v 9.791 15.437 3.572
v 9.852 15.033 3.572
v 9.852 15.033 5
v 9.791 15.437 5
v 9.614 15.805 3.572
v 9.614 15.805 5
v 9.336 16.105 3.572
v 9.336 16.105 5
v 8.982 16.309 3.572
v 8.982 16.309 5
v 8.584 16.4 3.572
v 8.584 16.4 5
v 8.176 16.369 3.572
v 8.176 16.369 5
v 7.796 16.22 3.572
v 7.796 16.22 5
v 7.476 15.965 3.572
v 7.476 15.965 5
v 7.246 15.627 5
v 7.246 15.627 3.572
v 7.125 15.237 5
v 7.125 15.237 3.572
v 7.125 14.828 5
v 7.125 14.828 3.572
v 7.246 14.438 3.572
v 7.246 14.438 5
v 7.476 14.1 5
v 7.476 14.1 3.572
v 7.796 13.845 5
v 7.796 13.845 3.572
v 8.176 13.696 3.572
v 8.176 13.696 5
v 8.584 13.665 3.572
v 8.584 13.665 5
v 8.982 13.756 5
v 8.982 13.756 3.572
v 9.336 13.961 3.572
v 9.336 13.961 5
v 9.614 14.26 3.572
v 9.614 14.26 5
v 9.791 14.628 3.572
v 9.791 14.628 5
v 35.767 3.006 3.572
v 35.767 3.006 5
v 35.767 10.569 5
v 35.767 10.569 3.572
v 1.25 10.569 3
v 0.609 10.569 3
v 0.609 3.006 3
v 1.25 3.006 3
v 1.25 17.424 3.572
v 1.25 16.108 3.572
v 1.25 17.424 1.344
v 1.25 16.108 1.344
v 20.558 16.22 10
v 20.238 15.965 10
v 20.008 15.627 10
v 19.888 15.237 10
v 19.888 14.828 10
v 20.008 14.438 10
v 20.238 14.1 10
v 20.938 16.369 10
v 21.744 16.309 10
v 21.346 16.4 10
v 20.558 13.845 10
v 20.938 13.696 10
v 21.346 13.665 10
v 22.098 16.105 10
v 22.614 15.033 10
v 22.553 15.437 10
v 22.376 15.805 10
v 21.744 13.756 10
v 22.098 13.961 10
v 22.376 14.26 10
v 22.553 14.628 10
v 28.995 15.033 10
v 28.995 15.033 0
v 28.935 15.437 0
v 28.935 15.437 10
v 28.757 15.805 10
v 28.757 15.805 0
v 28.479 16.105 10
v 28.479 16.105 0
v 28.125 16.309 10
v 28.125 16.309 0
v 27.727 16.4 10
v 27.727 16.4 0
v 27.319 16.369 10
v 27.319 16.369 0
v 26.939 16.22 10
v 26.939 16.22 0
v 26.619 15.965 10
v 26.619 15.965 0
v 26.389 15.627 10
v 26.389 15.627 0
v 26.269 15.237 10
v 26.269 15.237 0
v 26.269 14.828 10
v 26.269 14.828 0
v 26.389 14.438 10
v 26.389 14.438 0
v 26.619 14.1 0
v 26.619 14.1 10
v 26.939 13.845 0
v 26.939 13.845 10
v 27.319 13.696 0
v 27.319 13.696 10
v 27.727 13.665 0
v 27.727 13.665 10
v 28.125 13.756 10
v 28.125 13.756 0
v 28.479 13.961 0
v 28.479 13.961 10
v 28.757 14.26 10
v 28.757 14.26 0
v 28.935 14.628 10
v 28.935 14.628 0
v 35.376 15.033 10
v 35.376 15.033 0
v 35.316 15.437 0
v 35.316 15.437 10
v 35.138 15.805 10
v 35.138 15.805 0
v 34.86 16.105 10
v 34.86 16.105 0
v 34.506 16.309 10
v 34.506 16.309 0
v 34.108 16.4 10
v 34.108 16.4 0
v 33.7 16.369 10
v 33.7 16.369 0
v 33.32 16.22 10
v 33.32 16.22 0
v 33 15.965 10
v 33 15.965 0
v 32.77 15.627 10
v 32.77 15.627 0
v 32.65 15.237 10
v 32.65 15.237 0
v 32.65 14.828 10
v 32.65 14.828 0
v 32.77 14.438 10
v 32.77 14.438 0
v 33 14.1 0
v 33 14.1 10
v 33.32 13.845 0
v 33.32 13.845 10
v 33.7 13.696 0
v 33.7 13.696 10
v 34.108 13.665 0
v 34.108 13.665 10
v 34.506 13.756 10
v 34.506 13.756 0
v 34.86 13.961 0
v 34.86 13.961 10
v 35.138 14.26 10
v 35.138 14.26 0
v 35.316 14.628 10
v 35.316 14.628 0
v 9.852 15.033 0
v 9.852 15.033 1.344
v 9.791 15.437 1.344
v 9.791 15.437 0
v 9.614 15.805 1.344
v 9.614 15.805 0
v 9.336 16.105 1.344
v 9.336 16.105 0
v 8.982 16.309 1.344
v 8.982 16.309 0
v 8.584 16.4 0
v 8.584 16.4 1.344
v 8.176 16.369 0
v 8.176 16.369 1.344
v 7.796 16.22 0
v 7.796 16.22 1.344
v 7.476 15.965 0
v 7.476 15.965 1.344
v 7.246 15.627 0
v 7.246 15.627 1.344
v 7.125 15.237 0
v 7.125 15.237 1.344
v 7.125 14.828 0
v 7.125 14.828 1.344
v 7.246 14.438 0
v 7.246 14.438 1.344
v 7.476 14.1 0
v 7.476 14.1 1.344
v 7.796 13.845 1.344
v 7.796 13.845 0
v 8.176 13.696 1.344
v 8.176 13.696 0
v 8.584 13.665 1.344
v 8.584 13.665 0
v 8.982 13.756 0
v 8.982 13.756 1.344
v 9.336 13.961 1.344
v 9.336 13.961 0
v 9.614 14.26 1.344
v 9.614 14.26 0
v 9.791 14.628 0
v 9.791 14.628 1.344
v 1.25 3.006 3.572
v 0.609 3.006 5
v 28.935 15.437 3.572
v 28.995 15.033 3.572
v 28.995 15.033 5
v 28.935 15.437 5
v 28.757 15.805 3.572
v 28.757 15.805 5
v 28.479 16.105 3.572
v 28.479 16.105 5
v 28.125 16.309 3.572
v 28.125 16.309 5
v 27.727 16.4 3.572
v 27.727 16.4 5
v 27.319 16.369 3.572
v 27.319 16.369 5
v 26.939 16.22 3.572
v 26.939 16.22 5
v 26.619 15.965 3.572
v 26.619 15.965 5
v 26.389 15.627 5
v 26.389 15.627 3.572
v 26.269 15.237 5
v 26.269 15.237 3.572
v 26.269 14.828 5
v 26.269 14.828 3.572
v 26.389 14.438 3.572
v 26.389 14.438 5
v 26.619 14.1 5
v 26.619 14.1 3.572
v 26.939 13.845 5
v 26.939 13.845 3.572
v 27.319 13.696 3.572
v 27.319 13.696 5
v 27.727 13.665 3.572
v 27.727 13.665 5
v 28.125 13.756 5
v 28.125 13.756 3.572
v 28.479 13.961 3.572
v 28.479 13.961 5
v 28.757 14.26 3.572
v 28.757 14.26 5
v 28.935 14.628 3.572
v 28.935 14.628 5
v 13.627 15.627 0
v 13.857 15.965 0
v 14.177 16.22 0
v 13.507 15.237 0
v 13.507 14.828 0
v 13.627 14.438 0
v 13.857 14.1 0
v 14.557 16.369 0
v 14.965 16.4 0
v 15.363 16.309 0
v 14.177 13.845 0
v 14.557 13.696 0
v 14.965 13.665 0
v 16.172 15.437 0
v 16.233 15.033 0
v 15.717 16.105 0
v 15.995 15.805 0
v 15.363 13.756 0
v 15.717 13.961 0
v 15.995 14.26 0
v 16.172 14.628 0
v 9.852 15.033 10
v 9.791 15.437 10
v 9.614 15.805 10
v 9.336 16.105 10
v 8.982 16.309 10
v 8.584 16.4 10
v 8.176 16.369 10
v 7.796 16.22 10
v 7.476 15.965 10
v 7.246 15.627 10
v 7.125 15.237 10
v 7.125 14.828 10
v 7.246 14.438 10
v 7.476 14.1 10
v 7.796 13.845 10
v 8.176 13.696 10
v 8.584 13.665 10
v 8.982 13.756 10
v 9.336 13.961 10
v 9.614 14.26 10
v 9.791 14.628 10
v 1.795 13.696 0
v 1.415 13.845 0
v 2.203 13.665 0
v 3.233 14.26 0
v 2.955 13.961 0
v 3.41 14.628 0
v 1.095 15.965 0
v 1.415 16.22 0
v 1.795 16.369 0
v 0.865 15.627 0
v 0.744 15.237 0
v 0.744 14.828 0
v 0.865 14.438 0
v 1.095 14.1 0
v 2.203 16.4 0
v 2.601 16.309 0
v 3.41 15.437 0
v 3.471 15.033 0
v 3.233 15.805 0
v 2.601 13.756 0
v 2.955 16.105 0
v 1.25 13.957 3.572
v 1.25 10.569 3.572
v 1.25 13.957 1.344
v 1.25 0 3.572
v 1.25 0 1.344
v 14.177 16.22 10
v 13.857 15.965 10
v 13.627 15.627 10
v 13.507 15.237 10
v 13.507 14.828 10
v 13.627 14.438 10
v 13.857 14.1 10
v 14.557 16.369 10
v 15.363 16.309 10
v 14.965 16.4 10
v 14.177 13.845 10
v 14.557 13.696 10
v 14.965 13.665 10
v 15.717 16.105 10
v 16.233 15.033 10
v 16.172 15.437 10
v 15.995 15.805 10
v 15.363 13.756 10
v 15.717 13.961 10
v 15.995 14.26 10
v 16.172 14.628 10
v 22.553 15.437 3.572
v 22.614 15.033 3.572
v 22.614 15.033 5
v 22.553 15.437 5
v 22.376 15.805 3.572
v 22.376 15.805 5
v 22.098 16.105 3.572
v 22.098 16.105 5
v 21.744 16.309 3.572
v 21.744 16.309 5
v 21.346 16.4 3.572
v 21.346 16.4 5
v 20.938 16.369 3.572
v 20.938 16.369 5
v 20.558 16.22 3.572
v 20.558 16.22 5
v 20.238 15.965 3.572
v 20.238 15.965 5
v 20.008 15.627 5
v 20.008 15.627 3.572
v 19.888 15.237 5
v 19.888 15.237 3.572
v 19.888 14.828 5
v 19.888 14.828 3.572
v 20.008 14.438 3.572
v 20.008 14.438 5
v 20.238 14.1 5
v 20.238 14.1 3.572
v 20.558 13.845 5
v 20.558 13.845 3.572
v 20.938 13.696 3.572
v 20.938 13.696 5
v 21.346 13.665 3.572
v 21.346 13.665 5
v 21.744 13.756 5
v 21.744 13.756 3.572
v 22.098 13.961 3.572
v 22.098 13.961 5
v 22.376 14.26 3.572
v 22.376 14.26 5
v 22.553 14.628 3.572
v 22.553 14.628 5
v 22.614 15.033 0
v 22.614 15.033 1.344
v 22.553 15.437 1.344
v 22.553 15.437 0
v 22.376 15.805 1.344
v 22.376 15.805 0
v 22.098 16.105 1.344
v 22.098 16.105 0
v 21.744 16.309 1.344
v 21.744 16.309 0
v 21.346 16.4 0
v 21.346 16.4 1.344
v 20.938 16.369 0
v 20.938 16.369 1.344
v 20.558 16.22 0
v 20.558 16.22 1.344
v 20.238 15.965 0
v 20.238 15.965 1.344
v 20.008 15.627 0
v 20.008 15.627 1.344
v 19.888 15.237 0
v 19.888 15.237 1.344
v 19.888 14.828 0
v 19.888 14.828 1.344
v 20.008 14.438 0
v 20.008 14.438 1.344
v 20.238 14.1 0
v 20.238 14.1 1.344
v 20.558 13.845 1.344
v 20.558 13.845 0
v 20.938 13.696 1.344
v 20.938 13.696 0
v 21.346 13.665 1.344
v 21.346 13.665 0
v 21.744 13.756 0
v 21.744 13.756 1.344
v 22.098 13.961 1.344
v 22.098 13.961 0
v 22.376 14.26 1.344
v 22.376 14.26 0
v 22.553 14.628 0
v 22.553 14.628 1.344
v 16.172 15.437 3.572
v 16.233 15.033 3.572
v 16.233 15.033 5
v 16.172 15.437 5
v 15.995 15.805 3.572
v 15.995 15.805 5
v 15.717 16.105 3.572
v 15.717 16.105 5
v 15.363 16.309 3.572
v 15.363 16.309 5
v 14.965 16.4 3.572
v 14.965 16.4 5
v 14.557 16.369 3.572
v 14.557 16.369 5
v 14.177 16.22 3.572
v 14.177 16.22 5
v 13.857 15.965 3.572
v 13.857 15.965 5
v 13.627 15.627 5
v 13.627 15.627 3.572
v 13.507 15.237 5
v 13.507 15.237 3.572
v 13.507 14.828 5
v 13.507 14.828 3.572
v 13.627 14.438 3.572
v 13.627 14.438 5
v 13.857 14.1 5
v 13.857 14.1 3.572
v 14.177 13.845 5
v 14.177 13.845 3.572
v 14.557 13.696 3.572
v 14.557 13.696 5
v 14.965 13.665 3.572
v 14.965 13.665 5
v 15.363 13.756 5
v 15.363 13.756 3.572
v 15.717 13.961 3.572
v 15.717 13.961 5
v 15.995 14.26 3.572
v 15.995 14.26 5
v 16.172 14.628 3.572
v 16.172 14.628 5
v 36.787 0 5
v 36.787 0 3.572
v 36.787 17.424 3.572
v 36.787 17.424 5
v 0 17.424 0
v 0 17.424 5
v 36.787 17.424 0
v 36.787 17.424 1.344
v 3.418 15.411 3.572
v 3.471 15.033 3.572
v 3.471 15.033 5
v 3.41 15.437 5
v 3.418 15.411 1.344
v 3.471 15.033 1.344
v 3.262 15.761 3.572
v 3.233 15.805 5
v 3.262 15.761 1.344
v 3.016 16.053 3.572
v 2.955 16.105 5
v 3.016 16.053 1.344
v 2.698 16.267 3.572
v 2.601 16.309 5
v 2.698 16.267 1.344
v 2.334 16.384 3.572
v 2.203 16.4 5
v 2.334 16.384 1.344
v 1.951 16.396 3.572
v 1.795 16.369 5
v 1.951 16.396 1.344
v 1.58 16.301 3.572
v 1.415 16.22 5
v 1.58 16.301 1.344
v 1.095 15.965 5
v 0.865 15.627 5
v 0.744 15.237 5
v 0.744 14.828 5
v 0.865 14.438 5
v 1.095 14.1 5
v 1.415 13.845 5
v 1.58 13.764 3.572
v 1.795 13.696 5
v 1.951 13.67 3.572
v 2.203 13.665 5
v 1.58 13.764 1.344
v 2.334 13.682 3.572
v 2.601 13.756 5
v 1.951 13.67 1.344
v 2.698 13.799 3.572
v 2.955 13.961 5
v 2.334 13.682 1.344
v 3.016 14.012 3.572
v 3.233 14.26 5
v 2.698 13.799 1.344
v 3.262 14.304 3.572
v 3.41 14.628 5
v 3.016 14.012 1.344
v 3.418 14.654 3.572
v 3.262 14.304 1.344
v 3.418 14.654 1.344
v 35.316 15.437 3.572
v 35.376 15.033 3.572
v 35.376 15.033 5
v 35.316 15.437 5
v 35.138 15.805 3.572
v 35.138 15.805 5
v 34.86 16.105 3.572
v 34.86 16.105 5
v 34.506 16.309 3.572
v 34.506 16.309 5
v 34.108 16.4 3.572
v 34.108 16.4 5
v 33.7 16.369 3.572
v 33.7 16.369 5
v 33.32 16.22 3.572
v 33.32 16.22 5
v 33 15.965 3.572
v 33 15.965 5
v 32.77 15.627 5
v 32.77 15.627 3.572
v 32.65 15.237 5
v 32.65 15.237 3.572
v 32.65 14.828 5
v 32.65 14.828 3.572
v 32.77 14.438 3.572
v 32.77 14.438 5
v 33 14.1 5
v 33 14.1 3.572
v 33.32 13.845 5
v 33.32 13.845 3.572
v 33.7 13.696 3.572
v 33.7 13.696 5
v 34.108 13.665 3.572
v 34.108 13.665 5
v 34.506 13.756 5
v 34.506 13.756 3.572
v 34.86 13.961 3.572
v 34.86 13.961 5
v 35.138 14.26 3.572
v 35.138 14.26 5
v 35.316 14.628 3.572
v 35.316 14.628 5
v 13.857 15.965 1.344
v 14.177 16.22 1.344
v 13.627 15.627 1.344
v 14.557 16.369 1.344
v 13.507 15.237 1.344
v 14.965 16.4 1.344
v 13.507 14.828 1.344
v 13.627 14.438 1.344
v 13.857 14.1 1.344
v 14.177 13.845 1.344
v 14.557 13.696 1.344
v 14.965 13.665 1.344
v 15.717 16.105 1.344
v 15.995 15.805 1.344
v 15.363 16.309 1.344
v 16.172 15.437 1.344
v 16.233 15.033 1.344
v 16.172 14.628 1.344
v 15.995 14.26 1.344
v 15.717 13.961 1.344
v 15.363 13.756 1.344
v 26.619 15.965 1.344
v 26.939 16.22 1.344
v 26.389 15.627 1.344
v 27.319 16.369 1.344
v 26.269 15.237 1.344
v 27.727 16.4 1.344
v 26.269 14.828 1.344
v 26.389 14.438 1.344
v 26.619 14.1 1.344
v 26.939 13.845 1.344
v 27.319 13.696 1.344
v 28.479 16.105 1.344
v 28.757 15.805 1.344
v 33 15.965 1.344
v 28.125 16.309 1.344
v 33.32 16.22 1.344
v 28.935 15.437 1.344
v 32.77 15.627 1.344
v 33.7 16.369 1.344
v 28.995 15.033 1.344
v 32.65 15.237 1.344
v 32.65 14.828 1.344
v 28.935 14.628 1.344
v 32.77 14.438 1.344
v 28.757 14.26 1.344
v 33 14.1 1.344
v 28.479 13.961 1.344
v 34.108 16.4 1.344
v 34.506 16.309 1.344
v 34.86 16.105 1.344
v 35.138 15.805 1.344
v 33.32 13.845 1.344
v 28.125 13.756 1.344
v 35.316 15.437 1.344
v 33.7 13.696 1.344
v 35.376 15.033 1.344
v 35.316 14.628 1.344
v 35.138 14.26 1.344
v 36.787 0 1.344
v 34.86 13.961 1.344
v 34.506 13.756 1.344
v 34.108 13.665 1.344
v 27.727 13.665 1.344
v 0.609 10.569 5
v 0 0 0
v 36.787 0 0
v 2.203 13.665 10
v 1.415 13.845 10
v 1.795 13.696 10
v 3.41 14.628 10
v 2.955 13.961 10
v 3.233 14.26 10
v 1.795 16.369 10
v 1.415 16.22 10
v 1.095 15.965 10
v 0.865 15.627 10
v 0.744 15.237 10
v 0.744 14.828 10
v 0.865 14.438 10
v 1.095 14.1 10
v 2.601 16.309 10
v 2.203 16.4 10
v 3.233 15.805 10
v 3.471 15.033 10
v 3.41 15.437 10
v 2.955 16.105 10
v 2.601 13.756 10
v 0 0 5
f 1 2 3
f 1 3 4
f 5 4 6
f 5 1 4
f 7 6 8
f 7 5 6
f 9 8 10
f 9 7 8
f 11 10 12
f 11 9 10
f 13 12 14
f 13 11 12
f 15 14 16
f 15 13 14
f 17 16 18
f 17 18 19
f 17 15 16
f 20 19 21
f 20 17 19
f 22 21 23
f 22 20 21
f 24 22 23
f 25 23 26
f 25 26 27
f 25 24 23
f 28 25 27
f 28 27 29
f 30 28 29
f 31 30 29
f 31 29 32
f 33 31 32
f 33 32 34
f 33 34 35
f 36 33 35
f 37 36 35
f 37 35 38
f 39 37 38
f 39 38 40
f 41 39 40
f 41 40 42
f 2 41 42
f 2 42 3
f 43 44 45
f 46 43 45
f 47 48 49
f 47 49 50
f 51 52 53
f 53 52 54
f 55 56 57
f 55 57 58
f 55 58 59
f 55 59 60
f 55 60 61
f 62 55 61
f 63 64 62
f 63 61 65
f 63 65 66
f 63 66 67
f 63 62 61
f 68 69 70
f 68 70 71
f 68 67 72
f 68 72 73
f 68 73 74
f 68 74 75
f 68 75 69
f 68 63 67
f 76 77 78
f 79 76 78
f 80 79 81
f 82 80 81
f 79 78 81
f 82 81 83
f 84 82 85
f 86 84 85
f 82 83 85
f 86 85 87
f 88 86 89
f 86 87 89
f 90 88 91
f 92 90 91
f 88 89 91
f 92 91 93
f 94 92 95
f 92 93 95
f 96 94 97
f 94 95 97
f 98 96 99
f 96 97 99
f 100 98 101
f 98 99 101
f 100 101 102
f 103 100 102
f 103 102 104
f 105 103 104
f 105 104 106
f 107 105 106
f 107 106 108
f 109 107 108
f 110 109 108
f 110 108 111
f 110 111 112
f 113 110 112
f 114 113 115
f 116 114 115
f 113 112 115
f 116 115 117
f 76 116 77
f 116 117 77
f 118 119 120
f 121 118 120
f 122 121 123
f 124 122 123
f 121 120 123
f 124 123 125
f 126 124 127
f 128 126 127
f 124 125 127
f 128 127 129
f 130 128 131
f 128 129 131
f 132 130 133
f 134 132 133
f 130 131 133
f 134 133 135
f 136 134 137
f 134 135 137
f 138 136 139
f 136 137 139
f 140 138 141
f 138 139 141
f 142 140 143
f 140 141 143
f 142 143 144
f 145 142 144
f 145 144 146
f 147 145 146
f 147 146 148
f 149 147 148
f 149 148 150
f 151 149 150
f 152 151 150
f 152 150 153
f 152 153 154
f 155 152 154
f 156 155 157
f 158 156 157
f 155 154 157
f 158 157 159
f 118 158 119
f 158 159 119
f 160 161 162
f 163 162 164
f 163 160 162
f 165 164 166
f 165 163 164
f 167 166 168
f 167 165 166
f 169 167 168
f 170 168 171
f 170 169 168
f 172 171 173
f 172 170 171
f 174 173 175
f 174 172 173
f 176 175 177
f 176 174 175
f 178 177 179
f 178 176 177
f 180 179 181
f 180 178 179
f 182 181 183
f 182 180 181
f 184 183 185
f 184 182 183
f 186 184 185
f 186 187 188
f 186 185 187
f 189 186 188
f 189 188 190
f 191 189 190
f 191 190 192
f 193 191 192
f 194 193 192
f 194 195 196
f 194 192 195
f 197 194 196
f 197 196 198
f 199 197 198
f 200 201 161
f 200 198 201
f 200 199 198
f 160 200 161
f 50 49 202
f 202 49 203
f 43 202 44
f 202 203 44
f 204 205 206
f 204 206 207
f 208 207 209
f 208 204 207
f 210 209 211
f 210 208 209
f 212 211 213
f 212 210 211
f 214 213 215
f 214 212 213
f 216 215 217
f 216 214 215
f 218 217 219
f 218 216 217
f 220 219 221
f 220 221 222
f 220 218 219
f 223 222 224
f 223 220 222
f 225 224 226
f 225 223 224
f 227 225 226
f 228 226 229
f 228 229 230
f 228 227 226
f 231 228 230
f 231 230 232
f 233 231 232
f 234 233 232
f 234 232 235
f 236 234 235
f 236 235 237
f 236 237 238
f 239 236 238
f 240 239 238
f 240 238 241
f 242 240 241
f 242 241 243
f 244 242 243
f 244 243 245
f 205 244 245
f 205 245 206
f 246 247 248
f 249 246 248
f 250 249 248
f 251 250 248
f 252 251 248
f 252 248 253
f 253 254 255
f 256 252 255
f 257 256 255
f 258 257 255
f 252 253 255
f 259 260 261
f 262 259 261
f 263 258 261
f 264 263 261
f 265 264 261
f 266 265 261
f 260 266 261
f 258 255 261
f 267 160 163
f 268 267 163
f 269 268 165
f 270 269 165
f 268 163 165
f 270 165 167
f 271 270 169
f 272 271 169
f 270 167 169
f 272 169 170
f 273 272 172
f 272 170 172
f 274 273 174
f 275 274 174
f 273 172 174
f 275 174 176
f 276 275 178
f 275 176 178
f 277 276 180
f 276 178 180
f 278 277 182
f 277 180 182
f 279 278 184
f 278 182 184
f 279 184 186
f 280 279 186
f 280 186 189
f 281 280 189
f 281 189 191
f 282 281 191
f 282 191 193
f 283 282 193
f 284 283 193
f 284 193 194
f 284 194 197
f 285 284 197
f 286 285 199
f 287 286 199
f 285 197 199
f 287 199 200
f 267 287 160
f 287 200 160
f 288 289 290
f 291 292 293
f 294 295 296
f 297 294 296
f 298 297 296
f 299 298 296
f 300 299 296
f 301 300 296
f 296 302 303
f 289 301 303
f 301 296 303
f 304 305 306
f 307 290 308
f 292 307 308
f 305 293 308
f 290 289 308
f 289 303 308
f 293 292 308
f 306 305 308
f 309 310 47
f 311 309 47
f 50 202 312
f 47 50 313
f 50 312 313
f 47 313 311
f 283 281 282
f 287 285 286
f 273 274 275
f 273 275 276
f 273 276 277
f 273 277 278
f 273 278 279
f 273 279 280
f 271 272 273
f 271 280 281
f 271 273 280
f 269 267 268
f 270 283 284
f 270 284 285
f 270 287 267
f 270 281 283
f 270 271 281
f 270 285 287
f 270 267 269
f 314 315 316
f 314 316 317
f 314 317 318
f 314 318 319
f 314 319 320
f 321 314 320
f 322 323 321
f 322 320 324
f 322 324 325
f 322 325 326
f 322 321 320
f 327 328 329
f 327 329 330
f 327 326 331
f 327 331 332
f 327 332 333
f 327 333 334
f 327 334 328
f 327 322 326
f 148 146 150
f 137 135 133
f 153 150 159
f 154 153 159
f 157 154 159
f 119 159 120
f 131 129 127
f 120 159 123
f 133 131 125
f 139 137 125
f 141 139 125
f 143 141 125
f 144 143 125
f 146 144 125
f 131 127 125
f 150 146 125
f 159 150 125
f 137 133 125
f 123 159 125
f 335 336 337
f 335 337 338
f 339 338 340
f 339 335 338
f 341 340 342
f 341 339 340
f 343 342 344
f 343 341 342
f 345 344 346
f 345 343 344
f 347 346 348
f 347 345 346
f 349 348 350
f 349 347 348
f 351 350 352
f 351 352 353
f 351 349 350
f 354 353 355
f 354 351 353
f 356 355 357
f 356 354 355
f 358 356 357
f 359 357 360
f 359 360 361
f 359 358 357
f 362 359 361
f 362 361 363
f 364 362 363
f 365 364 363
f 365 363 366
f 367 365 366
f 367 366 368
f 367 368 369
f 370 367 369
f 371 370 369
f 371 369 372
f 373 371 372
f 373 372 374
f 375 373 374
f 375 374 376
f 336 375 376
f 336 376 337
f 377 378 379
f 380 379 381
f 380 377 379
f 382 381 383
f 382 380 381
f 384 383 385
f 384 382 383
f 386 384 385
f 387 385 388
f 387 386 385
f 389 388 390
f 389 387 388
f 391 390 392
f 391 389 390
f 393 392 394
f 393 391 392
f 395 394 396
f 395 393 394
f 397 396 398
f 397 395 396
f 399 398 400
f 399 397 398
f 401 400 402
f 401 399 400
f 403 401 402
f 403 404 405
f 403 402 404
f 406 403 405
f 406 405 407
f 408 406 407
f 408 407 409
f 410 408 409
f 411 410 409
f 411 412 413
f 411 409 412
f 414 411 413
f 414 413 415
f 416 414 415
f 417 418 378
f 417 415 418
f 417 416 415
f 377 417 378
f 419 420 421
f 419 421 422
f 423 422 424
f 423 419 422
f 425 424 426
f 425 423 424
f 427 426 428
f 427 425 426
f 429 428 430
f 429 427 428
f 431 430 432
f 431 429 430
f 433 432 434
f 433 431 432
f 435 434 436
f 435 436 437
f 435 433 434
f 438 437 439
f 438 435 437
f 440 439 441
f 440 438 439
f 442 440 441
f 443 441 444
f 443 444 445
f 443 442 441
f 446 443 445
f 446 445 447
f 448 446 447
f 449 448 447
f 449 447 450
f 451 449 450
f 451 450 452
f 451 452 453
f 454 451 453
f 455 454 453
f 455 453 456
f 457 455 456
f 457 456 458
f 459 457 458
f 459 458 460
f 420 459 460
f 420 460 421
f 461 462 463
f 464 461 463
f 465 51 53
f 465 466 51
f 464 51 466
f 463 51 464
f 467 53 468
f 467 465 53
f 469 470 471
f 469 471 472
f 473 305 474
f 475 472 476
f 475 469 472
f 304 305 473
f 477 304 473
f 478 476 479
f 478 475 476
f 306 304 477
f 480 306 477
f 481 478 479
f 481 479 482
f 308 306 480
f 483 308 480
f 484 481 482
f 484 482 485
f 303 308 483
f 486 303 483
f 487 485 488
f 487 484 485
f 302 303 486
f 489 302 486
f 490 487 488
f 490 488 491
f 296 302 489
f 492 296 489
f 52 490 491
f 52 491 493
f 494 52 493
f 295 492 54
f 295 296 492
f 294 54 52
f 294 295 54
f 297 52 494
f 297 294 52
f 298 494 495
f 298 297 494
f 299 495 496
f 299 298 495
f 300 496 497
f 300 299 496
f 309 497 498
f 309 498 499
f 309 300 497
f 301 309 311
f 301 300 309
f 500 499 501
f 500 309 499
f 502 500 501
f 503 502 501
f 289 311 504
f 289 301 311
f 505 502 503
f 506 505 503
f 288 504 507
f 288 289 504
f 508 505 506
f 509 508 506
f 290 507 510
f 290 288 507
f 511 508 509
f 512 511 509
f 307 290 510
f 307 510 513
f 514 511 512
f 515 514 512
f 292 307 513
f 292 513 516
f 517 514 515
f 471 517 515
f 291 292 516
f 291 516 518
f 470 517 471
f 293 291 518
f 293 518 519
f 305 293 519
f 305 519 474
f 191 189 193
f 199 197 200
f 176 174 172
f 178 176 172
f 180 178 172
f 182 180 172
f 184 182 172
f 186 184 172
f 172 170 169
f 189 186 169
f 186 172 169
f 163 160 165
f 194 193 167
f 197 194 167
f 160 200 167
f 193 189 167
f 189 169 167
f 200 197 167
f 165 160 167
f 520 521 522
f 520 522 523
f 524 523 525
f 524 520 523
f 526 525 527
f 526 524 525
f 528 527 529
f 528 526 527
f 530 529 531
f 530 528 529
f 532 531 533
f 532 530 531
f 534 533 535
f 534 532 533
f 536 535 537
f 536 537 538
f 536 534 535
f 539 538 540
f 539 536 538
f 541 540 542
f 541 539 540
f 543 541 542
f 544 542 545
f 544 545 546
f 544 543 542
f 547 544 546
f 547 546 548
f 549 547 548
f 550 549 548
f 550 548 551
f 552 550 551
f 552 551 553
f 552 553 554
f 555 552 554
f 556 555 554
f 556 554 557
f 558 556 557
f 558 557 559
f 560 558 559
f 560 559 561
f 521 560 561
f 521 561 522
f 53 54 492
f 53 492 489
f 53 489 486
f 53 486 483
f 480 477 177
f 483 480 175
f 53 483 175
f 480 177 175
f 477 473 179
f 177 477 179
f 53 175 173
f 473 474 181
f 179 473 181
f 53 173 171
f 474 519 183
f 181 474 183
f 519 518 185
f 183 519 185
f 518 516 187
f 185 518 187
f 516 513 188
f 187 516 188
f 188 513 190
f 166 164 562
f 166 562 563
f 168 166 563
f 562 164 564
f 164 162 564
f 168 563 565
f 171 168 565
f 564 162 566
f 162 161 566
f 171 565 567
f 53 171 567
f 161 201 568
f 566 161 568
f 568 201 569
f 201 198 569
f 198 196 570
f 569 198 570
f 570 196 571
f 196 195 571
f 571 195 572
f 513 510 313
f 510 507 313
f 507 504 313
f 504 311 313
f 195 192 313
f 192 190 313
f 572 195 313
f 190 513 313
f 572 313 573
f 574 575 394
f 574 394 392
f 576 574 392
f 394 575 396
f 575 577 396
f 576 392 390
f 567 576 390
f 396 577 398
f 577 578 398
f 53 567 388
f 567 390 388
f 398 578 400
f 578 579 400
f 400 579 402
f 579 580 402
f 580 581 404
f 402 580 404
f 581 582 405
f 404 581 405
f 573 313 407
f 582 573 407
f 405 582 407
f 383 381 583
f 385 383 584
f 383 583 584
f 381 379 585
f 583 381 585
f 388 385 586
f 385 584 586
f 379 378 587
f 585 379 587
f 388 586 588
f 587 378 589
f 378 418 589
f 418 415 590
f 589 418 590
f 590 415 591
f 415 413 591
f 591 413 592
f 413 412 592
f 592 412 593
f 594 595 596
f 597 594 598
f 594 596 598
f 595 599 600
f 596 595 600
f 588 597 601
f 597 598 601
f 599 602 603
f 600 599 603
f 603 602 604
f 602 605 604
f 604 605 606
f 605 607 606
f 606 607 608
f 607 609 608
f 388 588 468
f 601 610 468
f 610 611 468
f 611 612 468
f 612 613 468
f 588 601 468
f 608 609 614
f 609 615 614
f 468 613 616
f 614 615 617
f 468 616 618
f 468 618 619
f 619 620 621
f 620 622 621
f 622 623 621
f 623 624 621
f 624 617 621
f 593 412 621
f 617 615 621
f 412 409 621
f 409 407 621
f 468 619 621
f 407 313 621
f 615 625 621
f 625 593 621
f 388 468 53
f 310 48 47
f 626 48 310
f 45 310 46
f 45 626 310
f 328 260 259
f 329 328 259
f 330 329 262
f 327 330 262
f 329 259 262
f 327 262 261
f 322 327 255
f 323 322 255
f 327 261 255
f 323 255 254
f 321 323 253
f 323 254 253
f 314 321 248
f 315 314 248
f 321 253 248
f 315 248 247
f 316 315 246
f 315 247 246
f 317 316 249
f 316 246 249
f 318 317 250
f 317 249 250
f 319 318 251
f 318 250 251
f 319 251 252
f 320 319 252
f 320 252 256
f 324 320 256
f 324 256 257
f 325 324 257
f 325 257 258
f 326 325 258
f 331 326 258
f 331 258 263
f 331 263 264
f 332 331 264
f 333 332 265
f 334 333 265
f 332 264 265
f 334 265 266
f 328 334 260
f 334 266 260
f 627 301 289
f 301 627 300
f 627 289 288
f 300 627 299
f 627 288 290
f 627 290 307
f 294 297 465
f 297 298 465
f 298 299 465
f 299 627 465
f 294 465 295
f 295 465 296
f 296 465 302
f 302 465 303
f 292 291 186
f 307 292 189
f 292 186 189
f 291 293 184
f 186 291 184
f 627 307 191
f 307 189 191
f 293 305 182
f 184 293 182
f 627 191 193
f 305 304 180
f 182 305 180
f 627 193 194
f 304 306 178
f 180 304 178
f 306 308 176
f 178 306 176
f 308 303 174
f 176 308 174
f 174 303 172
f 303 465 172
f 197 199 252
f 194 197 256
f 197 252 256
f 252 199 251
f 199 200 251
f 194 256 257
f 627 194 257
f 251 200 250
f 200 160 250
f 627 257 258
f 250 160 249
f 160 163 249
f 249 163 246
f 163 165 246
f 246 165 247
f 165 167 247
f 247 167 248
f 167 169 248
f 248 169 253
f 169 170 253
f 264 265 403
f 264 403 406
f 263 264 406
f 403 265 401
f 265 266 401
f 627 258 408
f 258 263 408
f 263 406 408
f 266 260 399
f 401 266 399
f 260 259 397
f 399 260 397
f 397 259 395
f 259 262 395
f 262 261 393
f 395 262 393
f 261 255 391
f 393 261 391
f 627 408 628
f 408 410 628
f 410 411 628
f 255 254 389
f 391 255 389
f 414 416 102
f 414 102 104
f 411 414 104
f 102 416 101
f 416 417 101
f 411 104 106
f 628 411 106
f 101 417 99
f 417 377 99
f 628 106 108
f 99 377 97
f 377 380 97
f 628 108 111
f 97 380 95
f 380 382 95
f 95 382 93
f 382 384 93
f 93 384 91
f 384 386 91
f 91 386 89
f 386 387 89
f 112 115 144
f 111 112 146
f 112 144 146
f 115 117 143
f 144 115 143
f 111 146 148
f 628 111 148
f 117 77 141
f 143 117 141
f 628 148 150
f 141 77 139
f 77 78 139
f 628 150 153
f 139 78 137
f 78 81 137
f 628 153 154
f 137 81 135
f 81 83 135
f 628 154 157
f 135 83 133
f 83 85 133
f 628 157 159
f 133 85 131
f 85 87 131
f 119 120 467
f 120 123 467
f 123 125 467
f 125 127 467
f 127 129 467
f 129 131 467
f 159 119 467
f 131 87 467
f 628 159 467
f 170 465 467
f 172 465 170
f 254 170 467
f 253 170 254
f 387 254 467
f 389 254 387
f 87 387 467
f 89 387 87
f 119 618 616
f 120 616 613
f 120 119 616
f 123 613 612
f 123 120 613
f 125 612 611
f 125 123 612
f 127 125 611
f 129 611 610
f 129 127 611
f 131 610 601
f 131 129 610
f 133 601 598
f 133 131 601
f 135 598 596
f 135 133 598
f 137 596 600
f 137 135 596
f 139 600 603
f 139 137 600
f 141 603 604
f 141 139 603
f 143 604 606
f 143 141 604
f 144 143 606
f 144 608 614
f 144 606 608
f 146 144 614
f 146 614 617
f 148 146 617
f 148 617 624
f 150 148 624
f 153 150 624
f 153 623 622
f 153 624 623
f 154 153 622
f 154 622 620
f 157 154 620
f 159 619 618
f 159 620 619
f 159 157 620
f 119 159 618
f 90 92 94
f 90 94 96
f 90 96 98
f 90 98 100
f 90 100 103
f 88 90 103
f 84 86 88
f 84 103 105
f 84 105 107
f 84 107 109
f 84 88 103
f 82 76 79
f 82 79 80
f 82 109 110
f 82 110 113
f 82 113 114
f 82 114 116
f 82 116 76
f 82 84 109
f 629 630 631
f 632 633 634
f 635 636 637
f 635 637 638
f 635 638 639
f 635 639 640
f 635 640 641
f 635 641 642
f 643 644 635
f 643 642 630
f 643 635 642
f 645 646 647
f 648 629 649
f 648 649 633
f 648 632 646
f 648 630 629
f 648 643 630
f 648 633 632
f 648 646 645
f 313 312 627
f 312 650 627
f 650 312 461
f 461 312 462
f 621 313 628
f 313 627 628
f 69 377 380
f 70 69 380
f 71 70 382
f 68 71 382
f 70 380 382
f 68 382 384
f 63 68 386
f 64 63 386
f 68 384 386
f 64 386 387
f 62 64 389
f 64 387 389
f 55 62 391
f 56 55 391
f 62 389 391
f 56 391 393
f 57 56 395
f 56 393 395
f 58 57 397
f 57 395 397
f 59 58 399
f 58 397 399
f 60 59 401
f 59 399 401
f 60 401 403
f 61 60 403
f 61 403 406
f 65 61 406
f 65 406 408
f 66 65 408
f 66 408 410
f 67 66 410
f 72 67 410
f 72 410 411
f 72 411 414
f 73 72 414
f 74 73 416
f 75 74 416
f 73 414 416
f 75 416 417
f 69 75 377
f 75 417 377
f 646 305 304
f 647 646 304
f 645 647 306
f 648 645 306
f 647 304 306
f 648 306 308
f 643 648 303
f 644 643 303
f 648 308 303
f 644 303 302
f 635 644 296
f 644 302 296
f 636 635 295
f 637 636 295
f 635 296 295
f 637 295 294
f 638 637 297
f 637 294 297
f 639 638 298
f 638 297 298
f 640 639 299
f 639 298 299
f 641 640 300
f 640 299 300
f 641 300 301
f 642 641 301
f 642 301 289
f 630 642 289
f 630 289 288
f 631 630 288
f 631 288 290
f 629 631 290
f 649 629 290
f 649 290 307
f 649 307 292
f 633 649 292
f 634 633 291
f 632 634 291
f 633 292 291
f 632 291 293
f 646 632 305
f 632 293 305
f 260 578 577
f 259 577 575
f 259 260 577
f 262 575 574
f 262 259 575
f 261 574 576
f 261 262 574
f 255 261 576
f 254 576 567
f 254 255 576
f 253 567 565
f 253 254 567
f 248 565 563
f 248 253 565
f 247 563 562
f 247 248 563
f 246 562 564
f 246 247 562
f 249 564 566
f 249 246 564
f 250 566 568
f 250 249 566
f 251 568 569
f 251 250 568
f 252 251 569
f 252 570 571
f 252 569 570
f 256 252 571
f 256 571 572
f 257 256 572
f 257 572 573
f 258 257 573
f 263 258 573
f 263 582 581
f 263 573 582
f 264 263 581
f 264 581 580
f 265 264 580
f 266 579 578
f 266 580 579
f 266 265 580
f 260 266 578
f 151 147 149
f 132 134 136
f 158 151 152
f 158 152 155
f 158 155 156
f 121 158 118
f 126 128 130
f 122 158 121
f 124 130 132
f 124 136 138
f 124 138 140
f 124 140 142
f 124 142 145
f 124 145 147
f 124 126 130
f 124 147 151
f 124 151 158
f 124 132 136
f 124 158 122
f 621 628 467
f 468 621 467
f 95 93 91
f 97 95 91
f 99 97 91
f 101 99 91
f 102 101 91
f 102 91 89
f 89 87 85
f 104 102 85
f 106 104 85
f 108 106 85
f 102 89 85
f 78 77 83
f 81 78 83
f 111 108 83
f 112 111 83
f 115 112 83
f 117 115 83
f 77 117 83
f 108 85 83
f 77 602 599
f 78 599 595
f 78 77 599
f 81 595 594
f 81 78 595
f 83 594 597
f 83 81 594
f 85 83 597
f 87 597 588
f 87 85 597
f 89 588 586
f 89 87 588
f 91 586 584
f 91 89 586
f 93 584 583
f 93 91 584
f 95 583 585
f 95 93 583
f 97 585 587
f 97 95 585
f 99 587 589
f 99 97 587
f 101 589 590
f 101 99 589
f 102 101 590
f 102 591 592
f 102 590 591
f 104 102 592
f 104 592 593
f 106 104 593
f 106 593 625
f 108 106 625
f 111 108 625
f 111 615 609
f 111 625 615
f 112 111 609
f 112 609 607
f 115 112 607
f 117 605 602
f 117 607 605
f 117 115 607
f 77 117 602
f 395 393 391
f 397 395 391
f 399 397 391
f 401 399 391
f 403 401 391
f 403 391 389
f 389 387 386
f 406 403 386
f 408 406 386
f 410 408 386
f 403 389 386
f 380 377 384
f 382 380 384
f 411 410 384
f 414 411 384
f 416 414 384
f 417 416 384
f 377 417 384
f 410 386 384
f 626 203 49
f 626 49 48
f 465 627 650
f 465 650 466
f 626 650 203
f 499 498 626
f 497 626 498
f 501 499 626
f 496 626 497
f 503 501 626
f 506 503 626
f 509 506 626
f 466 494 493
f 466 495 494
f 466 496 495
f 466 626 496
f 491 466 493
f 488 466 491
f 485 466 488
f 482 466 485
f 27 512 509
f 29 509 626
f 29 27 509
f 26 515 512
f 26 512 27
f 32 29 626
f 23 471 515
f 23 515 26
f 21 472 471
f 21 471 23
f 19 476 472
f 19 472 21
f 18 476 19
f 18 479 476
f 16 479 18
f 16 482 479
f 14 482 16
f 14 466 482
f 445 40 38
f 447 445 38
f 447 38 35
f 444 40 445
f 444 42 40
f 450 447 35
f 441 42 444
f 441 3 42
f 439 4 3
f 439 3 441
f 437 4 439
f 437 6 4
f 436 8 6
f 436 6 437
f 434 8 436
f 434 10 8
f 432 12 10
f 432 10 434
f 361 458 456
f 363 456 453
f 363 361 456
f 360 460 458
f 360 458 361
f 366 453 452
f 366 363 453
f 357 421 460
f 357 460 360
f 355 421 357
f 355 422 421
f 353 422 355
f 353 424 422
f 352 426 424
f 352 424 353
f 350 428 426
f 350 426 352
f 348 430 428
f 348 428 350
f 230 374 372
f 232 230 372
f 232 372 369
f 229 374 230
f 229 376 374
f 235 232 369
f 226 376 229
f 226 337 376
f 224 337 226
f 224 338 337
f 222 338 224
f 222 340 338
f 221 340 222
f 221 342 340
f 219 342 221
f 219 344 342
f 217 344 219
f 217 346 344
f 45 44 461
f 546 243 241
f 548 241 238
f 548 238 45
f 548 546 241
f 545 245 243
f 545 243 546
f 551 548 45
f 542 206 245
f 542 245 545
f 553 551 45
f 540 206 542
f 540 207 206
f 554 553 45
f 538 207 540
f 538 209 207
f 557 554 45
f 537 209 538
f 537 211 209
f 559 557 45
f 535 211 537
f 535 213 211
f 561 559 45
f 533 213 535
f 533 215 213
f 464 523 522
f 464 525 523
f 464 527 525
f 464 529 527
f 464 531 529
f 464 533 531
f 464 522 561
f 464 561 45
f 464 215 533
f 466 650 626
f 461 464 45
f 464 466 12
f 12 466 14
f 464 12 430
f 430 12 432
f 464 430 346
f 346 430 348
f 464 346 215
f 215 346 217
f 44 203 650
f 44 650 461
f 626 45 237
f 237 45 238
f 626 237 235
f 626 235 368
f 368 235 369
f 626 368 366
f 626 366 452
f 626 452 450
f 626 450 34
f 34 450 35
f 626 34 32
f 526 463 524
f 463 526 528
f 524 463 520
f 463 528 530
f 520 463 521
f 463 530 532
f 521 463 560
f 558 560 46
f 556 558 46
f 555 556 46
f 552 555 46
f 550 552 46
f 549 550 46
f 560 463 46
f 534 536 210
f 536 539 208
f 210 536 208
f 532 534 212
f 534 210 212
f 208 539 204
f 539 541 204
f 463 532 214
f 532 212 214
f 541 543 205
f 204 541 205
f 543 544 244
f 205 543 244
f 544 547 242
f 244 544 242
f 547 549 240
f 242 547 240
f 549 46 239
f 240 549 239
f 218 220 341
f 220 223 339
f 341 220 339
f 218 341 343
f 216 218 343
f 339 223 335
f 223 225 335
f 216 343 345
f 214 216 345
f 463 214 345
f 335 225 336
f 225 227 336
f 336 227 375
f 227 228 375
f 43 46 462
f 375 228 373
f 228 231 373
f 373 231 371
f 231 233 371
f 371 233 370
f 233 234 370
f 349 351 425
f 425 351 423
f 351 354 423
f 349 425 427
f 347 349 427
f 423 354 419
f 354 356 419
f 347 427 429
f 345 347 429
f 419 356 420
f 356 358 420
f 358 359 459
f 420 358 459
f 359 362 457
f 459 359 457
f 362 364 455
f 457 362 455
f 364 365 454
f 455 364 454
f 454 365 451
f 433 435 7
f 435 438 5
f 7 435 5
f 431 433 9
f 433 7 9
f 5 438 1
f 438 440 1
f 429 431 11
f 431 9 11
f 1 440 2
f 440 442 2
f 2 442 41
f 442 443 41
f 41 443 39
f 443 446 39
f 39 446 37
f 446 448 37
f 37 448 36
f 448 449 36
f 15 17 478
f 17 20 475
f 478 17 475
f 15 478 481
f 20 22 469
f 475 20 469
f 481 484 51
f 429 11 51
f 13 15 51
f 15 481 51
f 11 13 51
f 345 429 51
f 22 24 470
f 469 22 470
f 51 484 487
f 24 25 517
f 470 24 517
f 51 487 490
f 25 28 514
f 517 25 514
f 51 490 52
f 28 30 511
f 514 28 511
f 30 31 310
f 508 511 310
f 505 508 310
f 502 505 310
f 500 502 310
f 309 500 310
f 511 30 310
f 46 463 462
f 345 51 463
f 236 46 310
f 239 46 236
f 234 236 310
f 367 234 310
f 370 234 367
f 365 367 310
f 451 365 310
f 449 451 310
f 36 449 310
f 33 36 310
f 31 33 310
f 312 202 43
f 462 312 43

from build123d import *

# Parameters (mm, degrees)
F0_R     = 1.3710803726
F1_DEPTH = 10
F0_W     = 36.7866121233
F0_H     = 17.4243357033
F2_DEPTH = 5
F3_W     = 35.1581810974
F3_H     = 7.5634159148
F4_DEPTH = 2
F6_DEPTH = 25


with BuildPart() as f1:
    # F0 (on Top) → F1 (new body)
    with BuildSketch(Plane.XY):
        with Locations((8.4812443238, 15.0325801224)):
            Circle(F0_R)
    extrude(amount=F1_DEPTH)


with BuildPart() as f1b:
    # F0 (on Top) → F1, piece 2 (new body)
    with BuildSketch(Plane.XY):
        with Locations((14.8622810375, 15.0325801224)):
            Circle(F0_R)
    extrude(amount=F1_DEPTH)


with BuildPart() as f1c:
    # F0 (on Top) → F1, piece 3 (new body)
    with BuildSketch(Plane.XY):
        with Locations((21.2433177512, 15.0325801224)):
            Circle(F0_R)
    extrude(amount=F1_DEPTH)


with BuildPart() as f1d:
    # F0 (on Top) → F1, piece 4 (new body)
    with BuildSketch(Plane.XY):
        with Locations((27.6243544649, 15.0325801224)):
            Circle(F0_R)
    extrude(amount=F1_DEPTH)


with BuildPart() as f1e:
    # F0 (on Top) → F1, piece 5 (new body)
    with BuildSketch(Plane.XY):
        with Locations((34.0053911787, 15.0325801224)):
            Circle(F0_R)
    extrude(amount=F1_DEPTH)


with BuildPart() as f1f:
    # F0 (on Top) → F1, piece 6 (new body)
    with BuildSketch(Plane.XY):
        with Locations((2.1002076101, 15.0325801224)):
            Circle(F0_R)
    extrude(amount=F1_DEPTH)


with BuildPart() as f2:
    # F0 (on Top) → F2 (new body)
    with BuildSketch(Plane.XY):
        with Locations((18.3933060616, 8.7121678516)):
            Rectangle(F0_W, F0_H)
        with Locations((2.1002076101, 15.0325801224)):
            Circle(F0_R, mode=Mode.SUBTRACT)
        with Locations((8.4812443238, 15.0325801224)):
            Circle(F0_R, mode=Mode.SUBTRACT)
        with Locations((14.8622810375, 15.0325801224)):
            Circle(F0_R, mode=Mode.SUBTRACT)
        with Locations((21.2433177512, 15.0325801224)):
            Circle(F0_R, mode=Mode.SUBTRACT)
        with Locations((27.6243544649, 15.0325801224)):
            Circle(F0_R, mode=Mode.SUBTRACT)
        with Locations((34.0053911787, 15.0325801224)):
            Circle(F0_R, mode=Mode.SUBTRACT)
    extrude(amount=F2_DEPTH)

    # F3 (on face) → F4 (cut)
    with BuildSketch(Plane.XY.offset(5)):
        with Locations((18.1877680589, 6.7874193192)):
            Rectangle(F3_W, F3_H)
    extrude(amount=-F4_DEPTH, mode=Mode.SUBTRACT)

    # F5 (on face) → F6 (cut)
    with BuildSketch(Plane.XZ):
        Polygon((1.2501757592, 3.5718409345), (1.2501757592, 1.3440612238), (36.7866121233, 1.3440612238), (37.6002937555, 1.3440612238), (37.6002937555, 3.5718409345), align=None)
    extrude(amount=-F6_DEPTH, mode=Mode.SUBTRACT)


solid = Compound([f1.part, f1b.part, f1c.part, f1d.part, f1e.part, f1f.part, f2.part])
